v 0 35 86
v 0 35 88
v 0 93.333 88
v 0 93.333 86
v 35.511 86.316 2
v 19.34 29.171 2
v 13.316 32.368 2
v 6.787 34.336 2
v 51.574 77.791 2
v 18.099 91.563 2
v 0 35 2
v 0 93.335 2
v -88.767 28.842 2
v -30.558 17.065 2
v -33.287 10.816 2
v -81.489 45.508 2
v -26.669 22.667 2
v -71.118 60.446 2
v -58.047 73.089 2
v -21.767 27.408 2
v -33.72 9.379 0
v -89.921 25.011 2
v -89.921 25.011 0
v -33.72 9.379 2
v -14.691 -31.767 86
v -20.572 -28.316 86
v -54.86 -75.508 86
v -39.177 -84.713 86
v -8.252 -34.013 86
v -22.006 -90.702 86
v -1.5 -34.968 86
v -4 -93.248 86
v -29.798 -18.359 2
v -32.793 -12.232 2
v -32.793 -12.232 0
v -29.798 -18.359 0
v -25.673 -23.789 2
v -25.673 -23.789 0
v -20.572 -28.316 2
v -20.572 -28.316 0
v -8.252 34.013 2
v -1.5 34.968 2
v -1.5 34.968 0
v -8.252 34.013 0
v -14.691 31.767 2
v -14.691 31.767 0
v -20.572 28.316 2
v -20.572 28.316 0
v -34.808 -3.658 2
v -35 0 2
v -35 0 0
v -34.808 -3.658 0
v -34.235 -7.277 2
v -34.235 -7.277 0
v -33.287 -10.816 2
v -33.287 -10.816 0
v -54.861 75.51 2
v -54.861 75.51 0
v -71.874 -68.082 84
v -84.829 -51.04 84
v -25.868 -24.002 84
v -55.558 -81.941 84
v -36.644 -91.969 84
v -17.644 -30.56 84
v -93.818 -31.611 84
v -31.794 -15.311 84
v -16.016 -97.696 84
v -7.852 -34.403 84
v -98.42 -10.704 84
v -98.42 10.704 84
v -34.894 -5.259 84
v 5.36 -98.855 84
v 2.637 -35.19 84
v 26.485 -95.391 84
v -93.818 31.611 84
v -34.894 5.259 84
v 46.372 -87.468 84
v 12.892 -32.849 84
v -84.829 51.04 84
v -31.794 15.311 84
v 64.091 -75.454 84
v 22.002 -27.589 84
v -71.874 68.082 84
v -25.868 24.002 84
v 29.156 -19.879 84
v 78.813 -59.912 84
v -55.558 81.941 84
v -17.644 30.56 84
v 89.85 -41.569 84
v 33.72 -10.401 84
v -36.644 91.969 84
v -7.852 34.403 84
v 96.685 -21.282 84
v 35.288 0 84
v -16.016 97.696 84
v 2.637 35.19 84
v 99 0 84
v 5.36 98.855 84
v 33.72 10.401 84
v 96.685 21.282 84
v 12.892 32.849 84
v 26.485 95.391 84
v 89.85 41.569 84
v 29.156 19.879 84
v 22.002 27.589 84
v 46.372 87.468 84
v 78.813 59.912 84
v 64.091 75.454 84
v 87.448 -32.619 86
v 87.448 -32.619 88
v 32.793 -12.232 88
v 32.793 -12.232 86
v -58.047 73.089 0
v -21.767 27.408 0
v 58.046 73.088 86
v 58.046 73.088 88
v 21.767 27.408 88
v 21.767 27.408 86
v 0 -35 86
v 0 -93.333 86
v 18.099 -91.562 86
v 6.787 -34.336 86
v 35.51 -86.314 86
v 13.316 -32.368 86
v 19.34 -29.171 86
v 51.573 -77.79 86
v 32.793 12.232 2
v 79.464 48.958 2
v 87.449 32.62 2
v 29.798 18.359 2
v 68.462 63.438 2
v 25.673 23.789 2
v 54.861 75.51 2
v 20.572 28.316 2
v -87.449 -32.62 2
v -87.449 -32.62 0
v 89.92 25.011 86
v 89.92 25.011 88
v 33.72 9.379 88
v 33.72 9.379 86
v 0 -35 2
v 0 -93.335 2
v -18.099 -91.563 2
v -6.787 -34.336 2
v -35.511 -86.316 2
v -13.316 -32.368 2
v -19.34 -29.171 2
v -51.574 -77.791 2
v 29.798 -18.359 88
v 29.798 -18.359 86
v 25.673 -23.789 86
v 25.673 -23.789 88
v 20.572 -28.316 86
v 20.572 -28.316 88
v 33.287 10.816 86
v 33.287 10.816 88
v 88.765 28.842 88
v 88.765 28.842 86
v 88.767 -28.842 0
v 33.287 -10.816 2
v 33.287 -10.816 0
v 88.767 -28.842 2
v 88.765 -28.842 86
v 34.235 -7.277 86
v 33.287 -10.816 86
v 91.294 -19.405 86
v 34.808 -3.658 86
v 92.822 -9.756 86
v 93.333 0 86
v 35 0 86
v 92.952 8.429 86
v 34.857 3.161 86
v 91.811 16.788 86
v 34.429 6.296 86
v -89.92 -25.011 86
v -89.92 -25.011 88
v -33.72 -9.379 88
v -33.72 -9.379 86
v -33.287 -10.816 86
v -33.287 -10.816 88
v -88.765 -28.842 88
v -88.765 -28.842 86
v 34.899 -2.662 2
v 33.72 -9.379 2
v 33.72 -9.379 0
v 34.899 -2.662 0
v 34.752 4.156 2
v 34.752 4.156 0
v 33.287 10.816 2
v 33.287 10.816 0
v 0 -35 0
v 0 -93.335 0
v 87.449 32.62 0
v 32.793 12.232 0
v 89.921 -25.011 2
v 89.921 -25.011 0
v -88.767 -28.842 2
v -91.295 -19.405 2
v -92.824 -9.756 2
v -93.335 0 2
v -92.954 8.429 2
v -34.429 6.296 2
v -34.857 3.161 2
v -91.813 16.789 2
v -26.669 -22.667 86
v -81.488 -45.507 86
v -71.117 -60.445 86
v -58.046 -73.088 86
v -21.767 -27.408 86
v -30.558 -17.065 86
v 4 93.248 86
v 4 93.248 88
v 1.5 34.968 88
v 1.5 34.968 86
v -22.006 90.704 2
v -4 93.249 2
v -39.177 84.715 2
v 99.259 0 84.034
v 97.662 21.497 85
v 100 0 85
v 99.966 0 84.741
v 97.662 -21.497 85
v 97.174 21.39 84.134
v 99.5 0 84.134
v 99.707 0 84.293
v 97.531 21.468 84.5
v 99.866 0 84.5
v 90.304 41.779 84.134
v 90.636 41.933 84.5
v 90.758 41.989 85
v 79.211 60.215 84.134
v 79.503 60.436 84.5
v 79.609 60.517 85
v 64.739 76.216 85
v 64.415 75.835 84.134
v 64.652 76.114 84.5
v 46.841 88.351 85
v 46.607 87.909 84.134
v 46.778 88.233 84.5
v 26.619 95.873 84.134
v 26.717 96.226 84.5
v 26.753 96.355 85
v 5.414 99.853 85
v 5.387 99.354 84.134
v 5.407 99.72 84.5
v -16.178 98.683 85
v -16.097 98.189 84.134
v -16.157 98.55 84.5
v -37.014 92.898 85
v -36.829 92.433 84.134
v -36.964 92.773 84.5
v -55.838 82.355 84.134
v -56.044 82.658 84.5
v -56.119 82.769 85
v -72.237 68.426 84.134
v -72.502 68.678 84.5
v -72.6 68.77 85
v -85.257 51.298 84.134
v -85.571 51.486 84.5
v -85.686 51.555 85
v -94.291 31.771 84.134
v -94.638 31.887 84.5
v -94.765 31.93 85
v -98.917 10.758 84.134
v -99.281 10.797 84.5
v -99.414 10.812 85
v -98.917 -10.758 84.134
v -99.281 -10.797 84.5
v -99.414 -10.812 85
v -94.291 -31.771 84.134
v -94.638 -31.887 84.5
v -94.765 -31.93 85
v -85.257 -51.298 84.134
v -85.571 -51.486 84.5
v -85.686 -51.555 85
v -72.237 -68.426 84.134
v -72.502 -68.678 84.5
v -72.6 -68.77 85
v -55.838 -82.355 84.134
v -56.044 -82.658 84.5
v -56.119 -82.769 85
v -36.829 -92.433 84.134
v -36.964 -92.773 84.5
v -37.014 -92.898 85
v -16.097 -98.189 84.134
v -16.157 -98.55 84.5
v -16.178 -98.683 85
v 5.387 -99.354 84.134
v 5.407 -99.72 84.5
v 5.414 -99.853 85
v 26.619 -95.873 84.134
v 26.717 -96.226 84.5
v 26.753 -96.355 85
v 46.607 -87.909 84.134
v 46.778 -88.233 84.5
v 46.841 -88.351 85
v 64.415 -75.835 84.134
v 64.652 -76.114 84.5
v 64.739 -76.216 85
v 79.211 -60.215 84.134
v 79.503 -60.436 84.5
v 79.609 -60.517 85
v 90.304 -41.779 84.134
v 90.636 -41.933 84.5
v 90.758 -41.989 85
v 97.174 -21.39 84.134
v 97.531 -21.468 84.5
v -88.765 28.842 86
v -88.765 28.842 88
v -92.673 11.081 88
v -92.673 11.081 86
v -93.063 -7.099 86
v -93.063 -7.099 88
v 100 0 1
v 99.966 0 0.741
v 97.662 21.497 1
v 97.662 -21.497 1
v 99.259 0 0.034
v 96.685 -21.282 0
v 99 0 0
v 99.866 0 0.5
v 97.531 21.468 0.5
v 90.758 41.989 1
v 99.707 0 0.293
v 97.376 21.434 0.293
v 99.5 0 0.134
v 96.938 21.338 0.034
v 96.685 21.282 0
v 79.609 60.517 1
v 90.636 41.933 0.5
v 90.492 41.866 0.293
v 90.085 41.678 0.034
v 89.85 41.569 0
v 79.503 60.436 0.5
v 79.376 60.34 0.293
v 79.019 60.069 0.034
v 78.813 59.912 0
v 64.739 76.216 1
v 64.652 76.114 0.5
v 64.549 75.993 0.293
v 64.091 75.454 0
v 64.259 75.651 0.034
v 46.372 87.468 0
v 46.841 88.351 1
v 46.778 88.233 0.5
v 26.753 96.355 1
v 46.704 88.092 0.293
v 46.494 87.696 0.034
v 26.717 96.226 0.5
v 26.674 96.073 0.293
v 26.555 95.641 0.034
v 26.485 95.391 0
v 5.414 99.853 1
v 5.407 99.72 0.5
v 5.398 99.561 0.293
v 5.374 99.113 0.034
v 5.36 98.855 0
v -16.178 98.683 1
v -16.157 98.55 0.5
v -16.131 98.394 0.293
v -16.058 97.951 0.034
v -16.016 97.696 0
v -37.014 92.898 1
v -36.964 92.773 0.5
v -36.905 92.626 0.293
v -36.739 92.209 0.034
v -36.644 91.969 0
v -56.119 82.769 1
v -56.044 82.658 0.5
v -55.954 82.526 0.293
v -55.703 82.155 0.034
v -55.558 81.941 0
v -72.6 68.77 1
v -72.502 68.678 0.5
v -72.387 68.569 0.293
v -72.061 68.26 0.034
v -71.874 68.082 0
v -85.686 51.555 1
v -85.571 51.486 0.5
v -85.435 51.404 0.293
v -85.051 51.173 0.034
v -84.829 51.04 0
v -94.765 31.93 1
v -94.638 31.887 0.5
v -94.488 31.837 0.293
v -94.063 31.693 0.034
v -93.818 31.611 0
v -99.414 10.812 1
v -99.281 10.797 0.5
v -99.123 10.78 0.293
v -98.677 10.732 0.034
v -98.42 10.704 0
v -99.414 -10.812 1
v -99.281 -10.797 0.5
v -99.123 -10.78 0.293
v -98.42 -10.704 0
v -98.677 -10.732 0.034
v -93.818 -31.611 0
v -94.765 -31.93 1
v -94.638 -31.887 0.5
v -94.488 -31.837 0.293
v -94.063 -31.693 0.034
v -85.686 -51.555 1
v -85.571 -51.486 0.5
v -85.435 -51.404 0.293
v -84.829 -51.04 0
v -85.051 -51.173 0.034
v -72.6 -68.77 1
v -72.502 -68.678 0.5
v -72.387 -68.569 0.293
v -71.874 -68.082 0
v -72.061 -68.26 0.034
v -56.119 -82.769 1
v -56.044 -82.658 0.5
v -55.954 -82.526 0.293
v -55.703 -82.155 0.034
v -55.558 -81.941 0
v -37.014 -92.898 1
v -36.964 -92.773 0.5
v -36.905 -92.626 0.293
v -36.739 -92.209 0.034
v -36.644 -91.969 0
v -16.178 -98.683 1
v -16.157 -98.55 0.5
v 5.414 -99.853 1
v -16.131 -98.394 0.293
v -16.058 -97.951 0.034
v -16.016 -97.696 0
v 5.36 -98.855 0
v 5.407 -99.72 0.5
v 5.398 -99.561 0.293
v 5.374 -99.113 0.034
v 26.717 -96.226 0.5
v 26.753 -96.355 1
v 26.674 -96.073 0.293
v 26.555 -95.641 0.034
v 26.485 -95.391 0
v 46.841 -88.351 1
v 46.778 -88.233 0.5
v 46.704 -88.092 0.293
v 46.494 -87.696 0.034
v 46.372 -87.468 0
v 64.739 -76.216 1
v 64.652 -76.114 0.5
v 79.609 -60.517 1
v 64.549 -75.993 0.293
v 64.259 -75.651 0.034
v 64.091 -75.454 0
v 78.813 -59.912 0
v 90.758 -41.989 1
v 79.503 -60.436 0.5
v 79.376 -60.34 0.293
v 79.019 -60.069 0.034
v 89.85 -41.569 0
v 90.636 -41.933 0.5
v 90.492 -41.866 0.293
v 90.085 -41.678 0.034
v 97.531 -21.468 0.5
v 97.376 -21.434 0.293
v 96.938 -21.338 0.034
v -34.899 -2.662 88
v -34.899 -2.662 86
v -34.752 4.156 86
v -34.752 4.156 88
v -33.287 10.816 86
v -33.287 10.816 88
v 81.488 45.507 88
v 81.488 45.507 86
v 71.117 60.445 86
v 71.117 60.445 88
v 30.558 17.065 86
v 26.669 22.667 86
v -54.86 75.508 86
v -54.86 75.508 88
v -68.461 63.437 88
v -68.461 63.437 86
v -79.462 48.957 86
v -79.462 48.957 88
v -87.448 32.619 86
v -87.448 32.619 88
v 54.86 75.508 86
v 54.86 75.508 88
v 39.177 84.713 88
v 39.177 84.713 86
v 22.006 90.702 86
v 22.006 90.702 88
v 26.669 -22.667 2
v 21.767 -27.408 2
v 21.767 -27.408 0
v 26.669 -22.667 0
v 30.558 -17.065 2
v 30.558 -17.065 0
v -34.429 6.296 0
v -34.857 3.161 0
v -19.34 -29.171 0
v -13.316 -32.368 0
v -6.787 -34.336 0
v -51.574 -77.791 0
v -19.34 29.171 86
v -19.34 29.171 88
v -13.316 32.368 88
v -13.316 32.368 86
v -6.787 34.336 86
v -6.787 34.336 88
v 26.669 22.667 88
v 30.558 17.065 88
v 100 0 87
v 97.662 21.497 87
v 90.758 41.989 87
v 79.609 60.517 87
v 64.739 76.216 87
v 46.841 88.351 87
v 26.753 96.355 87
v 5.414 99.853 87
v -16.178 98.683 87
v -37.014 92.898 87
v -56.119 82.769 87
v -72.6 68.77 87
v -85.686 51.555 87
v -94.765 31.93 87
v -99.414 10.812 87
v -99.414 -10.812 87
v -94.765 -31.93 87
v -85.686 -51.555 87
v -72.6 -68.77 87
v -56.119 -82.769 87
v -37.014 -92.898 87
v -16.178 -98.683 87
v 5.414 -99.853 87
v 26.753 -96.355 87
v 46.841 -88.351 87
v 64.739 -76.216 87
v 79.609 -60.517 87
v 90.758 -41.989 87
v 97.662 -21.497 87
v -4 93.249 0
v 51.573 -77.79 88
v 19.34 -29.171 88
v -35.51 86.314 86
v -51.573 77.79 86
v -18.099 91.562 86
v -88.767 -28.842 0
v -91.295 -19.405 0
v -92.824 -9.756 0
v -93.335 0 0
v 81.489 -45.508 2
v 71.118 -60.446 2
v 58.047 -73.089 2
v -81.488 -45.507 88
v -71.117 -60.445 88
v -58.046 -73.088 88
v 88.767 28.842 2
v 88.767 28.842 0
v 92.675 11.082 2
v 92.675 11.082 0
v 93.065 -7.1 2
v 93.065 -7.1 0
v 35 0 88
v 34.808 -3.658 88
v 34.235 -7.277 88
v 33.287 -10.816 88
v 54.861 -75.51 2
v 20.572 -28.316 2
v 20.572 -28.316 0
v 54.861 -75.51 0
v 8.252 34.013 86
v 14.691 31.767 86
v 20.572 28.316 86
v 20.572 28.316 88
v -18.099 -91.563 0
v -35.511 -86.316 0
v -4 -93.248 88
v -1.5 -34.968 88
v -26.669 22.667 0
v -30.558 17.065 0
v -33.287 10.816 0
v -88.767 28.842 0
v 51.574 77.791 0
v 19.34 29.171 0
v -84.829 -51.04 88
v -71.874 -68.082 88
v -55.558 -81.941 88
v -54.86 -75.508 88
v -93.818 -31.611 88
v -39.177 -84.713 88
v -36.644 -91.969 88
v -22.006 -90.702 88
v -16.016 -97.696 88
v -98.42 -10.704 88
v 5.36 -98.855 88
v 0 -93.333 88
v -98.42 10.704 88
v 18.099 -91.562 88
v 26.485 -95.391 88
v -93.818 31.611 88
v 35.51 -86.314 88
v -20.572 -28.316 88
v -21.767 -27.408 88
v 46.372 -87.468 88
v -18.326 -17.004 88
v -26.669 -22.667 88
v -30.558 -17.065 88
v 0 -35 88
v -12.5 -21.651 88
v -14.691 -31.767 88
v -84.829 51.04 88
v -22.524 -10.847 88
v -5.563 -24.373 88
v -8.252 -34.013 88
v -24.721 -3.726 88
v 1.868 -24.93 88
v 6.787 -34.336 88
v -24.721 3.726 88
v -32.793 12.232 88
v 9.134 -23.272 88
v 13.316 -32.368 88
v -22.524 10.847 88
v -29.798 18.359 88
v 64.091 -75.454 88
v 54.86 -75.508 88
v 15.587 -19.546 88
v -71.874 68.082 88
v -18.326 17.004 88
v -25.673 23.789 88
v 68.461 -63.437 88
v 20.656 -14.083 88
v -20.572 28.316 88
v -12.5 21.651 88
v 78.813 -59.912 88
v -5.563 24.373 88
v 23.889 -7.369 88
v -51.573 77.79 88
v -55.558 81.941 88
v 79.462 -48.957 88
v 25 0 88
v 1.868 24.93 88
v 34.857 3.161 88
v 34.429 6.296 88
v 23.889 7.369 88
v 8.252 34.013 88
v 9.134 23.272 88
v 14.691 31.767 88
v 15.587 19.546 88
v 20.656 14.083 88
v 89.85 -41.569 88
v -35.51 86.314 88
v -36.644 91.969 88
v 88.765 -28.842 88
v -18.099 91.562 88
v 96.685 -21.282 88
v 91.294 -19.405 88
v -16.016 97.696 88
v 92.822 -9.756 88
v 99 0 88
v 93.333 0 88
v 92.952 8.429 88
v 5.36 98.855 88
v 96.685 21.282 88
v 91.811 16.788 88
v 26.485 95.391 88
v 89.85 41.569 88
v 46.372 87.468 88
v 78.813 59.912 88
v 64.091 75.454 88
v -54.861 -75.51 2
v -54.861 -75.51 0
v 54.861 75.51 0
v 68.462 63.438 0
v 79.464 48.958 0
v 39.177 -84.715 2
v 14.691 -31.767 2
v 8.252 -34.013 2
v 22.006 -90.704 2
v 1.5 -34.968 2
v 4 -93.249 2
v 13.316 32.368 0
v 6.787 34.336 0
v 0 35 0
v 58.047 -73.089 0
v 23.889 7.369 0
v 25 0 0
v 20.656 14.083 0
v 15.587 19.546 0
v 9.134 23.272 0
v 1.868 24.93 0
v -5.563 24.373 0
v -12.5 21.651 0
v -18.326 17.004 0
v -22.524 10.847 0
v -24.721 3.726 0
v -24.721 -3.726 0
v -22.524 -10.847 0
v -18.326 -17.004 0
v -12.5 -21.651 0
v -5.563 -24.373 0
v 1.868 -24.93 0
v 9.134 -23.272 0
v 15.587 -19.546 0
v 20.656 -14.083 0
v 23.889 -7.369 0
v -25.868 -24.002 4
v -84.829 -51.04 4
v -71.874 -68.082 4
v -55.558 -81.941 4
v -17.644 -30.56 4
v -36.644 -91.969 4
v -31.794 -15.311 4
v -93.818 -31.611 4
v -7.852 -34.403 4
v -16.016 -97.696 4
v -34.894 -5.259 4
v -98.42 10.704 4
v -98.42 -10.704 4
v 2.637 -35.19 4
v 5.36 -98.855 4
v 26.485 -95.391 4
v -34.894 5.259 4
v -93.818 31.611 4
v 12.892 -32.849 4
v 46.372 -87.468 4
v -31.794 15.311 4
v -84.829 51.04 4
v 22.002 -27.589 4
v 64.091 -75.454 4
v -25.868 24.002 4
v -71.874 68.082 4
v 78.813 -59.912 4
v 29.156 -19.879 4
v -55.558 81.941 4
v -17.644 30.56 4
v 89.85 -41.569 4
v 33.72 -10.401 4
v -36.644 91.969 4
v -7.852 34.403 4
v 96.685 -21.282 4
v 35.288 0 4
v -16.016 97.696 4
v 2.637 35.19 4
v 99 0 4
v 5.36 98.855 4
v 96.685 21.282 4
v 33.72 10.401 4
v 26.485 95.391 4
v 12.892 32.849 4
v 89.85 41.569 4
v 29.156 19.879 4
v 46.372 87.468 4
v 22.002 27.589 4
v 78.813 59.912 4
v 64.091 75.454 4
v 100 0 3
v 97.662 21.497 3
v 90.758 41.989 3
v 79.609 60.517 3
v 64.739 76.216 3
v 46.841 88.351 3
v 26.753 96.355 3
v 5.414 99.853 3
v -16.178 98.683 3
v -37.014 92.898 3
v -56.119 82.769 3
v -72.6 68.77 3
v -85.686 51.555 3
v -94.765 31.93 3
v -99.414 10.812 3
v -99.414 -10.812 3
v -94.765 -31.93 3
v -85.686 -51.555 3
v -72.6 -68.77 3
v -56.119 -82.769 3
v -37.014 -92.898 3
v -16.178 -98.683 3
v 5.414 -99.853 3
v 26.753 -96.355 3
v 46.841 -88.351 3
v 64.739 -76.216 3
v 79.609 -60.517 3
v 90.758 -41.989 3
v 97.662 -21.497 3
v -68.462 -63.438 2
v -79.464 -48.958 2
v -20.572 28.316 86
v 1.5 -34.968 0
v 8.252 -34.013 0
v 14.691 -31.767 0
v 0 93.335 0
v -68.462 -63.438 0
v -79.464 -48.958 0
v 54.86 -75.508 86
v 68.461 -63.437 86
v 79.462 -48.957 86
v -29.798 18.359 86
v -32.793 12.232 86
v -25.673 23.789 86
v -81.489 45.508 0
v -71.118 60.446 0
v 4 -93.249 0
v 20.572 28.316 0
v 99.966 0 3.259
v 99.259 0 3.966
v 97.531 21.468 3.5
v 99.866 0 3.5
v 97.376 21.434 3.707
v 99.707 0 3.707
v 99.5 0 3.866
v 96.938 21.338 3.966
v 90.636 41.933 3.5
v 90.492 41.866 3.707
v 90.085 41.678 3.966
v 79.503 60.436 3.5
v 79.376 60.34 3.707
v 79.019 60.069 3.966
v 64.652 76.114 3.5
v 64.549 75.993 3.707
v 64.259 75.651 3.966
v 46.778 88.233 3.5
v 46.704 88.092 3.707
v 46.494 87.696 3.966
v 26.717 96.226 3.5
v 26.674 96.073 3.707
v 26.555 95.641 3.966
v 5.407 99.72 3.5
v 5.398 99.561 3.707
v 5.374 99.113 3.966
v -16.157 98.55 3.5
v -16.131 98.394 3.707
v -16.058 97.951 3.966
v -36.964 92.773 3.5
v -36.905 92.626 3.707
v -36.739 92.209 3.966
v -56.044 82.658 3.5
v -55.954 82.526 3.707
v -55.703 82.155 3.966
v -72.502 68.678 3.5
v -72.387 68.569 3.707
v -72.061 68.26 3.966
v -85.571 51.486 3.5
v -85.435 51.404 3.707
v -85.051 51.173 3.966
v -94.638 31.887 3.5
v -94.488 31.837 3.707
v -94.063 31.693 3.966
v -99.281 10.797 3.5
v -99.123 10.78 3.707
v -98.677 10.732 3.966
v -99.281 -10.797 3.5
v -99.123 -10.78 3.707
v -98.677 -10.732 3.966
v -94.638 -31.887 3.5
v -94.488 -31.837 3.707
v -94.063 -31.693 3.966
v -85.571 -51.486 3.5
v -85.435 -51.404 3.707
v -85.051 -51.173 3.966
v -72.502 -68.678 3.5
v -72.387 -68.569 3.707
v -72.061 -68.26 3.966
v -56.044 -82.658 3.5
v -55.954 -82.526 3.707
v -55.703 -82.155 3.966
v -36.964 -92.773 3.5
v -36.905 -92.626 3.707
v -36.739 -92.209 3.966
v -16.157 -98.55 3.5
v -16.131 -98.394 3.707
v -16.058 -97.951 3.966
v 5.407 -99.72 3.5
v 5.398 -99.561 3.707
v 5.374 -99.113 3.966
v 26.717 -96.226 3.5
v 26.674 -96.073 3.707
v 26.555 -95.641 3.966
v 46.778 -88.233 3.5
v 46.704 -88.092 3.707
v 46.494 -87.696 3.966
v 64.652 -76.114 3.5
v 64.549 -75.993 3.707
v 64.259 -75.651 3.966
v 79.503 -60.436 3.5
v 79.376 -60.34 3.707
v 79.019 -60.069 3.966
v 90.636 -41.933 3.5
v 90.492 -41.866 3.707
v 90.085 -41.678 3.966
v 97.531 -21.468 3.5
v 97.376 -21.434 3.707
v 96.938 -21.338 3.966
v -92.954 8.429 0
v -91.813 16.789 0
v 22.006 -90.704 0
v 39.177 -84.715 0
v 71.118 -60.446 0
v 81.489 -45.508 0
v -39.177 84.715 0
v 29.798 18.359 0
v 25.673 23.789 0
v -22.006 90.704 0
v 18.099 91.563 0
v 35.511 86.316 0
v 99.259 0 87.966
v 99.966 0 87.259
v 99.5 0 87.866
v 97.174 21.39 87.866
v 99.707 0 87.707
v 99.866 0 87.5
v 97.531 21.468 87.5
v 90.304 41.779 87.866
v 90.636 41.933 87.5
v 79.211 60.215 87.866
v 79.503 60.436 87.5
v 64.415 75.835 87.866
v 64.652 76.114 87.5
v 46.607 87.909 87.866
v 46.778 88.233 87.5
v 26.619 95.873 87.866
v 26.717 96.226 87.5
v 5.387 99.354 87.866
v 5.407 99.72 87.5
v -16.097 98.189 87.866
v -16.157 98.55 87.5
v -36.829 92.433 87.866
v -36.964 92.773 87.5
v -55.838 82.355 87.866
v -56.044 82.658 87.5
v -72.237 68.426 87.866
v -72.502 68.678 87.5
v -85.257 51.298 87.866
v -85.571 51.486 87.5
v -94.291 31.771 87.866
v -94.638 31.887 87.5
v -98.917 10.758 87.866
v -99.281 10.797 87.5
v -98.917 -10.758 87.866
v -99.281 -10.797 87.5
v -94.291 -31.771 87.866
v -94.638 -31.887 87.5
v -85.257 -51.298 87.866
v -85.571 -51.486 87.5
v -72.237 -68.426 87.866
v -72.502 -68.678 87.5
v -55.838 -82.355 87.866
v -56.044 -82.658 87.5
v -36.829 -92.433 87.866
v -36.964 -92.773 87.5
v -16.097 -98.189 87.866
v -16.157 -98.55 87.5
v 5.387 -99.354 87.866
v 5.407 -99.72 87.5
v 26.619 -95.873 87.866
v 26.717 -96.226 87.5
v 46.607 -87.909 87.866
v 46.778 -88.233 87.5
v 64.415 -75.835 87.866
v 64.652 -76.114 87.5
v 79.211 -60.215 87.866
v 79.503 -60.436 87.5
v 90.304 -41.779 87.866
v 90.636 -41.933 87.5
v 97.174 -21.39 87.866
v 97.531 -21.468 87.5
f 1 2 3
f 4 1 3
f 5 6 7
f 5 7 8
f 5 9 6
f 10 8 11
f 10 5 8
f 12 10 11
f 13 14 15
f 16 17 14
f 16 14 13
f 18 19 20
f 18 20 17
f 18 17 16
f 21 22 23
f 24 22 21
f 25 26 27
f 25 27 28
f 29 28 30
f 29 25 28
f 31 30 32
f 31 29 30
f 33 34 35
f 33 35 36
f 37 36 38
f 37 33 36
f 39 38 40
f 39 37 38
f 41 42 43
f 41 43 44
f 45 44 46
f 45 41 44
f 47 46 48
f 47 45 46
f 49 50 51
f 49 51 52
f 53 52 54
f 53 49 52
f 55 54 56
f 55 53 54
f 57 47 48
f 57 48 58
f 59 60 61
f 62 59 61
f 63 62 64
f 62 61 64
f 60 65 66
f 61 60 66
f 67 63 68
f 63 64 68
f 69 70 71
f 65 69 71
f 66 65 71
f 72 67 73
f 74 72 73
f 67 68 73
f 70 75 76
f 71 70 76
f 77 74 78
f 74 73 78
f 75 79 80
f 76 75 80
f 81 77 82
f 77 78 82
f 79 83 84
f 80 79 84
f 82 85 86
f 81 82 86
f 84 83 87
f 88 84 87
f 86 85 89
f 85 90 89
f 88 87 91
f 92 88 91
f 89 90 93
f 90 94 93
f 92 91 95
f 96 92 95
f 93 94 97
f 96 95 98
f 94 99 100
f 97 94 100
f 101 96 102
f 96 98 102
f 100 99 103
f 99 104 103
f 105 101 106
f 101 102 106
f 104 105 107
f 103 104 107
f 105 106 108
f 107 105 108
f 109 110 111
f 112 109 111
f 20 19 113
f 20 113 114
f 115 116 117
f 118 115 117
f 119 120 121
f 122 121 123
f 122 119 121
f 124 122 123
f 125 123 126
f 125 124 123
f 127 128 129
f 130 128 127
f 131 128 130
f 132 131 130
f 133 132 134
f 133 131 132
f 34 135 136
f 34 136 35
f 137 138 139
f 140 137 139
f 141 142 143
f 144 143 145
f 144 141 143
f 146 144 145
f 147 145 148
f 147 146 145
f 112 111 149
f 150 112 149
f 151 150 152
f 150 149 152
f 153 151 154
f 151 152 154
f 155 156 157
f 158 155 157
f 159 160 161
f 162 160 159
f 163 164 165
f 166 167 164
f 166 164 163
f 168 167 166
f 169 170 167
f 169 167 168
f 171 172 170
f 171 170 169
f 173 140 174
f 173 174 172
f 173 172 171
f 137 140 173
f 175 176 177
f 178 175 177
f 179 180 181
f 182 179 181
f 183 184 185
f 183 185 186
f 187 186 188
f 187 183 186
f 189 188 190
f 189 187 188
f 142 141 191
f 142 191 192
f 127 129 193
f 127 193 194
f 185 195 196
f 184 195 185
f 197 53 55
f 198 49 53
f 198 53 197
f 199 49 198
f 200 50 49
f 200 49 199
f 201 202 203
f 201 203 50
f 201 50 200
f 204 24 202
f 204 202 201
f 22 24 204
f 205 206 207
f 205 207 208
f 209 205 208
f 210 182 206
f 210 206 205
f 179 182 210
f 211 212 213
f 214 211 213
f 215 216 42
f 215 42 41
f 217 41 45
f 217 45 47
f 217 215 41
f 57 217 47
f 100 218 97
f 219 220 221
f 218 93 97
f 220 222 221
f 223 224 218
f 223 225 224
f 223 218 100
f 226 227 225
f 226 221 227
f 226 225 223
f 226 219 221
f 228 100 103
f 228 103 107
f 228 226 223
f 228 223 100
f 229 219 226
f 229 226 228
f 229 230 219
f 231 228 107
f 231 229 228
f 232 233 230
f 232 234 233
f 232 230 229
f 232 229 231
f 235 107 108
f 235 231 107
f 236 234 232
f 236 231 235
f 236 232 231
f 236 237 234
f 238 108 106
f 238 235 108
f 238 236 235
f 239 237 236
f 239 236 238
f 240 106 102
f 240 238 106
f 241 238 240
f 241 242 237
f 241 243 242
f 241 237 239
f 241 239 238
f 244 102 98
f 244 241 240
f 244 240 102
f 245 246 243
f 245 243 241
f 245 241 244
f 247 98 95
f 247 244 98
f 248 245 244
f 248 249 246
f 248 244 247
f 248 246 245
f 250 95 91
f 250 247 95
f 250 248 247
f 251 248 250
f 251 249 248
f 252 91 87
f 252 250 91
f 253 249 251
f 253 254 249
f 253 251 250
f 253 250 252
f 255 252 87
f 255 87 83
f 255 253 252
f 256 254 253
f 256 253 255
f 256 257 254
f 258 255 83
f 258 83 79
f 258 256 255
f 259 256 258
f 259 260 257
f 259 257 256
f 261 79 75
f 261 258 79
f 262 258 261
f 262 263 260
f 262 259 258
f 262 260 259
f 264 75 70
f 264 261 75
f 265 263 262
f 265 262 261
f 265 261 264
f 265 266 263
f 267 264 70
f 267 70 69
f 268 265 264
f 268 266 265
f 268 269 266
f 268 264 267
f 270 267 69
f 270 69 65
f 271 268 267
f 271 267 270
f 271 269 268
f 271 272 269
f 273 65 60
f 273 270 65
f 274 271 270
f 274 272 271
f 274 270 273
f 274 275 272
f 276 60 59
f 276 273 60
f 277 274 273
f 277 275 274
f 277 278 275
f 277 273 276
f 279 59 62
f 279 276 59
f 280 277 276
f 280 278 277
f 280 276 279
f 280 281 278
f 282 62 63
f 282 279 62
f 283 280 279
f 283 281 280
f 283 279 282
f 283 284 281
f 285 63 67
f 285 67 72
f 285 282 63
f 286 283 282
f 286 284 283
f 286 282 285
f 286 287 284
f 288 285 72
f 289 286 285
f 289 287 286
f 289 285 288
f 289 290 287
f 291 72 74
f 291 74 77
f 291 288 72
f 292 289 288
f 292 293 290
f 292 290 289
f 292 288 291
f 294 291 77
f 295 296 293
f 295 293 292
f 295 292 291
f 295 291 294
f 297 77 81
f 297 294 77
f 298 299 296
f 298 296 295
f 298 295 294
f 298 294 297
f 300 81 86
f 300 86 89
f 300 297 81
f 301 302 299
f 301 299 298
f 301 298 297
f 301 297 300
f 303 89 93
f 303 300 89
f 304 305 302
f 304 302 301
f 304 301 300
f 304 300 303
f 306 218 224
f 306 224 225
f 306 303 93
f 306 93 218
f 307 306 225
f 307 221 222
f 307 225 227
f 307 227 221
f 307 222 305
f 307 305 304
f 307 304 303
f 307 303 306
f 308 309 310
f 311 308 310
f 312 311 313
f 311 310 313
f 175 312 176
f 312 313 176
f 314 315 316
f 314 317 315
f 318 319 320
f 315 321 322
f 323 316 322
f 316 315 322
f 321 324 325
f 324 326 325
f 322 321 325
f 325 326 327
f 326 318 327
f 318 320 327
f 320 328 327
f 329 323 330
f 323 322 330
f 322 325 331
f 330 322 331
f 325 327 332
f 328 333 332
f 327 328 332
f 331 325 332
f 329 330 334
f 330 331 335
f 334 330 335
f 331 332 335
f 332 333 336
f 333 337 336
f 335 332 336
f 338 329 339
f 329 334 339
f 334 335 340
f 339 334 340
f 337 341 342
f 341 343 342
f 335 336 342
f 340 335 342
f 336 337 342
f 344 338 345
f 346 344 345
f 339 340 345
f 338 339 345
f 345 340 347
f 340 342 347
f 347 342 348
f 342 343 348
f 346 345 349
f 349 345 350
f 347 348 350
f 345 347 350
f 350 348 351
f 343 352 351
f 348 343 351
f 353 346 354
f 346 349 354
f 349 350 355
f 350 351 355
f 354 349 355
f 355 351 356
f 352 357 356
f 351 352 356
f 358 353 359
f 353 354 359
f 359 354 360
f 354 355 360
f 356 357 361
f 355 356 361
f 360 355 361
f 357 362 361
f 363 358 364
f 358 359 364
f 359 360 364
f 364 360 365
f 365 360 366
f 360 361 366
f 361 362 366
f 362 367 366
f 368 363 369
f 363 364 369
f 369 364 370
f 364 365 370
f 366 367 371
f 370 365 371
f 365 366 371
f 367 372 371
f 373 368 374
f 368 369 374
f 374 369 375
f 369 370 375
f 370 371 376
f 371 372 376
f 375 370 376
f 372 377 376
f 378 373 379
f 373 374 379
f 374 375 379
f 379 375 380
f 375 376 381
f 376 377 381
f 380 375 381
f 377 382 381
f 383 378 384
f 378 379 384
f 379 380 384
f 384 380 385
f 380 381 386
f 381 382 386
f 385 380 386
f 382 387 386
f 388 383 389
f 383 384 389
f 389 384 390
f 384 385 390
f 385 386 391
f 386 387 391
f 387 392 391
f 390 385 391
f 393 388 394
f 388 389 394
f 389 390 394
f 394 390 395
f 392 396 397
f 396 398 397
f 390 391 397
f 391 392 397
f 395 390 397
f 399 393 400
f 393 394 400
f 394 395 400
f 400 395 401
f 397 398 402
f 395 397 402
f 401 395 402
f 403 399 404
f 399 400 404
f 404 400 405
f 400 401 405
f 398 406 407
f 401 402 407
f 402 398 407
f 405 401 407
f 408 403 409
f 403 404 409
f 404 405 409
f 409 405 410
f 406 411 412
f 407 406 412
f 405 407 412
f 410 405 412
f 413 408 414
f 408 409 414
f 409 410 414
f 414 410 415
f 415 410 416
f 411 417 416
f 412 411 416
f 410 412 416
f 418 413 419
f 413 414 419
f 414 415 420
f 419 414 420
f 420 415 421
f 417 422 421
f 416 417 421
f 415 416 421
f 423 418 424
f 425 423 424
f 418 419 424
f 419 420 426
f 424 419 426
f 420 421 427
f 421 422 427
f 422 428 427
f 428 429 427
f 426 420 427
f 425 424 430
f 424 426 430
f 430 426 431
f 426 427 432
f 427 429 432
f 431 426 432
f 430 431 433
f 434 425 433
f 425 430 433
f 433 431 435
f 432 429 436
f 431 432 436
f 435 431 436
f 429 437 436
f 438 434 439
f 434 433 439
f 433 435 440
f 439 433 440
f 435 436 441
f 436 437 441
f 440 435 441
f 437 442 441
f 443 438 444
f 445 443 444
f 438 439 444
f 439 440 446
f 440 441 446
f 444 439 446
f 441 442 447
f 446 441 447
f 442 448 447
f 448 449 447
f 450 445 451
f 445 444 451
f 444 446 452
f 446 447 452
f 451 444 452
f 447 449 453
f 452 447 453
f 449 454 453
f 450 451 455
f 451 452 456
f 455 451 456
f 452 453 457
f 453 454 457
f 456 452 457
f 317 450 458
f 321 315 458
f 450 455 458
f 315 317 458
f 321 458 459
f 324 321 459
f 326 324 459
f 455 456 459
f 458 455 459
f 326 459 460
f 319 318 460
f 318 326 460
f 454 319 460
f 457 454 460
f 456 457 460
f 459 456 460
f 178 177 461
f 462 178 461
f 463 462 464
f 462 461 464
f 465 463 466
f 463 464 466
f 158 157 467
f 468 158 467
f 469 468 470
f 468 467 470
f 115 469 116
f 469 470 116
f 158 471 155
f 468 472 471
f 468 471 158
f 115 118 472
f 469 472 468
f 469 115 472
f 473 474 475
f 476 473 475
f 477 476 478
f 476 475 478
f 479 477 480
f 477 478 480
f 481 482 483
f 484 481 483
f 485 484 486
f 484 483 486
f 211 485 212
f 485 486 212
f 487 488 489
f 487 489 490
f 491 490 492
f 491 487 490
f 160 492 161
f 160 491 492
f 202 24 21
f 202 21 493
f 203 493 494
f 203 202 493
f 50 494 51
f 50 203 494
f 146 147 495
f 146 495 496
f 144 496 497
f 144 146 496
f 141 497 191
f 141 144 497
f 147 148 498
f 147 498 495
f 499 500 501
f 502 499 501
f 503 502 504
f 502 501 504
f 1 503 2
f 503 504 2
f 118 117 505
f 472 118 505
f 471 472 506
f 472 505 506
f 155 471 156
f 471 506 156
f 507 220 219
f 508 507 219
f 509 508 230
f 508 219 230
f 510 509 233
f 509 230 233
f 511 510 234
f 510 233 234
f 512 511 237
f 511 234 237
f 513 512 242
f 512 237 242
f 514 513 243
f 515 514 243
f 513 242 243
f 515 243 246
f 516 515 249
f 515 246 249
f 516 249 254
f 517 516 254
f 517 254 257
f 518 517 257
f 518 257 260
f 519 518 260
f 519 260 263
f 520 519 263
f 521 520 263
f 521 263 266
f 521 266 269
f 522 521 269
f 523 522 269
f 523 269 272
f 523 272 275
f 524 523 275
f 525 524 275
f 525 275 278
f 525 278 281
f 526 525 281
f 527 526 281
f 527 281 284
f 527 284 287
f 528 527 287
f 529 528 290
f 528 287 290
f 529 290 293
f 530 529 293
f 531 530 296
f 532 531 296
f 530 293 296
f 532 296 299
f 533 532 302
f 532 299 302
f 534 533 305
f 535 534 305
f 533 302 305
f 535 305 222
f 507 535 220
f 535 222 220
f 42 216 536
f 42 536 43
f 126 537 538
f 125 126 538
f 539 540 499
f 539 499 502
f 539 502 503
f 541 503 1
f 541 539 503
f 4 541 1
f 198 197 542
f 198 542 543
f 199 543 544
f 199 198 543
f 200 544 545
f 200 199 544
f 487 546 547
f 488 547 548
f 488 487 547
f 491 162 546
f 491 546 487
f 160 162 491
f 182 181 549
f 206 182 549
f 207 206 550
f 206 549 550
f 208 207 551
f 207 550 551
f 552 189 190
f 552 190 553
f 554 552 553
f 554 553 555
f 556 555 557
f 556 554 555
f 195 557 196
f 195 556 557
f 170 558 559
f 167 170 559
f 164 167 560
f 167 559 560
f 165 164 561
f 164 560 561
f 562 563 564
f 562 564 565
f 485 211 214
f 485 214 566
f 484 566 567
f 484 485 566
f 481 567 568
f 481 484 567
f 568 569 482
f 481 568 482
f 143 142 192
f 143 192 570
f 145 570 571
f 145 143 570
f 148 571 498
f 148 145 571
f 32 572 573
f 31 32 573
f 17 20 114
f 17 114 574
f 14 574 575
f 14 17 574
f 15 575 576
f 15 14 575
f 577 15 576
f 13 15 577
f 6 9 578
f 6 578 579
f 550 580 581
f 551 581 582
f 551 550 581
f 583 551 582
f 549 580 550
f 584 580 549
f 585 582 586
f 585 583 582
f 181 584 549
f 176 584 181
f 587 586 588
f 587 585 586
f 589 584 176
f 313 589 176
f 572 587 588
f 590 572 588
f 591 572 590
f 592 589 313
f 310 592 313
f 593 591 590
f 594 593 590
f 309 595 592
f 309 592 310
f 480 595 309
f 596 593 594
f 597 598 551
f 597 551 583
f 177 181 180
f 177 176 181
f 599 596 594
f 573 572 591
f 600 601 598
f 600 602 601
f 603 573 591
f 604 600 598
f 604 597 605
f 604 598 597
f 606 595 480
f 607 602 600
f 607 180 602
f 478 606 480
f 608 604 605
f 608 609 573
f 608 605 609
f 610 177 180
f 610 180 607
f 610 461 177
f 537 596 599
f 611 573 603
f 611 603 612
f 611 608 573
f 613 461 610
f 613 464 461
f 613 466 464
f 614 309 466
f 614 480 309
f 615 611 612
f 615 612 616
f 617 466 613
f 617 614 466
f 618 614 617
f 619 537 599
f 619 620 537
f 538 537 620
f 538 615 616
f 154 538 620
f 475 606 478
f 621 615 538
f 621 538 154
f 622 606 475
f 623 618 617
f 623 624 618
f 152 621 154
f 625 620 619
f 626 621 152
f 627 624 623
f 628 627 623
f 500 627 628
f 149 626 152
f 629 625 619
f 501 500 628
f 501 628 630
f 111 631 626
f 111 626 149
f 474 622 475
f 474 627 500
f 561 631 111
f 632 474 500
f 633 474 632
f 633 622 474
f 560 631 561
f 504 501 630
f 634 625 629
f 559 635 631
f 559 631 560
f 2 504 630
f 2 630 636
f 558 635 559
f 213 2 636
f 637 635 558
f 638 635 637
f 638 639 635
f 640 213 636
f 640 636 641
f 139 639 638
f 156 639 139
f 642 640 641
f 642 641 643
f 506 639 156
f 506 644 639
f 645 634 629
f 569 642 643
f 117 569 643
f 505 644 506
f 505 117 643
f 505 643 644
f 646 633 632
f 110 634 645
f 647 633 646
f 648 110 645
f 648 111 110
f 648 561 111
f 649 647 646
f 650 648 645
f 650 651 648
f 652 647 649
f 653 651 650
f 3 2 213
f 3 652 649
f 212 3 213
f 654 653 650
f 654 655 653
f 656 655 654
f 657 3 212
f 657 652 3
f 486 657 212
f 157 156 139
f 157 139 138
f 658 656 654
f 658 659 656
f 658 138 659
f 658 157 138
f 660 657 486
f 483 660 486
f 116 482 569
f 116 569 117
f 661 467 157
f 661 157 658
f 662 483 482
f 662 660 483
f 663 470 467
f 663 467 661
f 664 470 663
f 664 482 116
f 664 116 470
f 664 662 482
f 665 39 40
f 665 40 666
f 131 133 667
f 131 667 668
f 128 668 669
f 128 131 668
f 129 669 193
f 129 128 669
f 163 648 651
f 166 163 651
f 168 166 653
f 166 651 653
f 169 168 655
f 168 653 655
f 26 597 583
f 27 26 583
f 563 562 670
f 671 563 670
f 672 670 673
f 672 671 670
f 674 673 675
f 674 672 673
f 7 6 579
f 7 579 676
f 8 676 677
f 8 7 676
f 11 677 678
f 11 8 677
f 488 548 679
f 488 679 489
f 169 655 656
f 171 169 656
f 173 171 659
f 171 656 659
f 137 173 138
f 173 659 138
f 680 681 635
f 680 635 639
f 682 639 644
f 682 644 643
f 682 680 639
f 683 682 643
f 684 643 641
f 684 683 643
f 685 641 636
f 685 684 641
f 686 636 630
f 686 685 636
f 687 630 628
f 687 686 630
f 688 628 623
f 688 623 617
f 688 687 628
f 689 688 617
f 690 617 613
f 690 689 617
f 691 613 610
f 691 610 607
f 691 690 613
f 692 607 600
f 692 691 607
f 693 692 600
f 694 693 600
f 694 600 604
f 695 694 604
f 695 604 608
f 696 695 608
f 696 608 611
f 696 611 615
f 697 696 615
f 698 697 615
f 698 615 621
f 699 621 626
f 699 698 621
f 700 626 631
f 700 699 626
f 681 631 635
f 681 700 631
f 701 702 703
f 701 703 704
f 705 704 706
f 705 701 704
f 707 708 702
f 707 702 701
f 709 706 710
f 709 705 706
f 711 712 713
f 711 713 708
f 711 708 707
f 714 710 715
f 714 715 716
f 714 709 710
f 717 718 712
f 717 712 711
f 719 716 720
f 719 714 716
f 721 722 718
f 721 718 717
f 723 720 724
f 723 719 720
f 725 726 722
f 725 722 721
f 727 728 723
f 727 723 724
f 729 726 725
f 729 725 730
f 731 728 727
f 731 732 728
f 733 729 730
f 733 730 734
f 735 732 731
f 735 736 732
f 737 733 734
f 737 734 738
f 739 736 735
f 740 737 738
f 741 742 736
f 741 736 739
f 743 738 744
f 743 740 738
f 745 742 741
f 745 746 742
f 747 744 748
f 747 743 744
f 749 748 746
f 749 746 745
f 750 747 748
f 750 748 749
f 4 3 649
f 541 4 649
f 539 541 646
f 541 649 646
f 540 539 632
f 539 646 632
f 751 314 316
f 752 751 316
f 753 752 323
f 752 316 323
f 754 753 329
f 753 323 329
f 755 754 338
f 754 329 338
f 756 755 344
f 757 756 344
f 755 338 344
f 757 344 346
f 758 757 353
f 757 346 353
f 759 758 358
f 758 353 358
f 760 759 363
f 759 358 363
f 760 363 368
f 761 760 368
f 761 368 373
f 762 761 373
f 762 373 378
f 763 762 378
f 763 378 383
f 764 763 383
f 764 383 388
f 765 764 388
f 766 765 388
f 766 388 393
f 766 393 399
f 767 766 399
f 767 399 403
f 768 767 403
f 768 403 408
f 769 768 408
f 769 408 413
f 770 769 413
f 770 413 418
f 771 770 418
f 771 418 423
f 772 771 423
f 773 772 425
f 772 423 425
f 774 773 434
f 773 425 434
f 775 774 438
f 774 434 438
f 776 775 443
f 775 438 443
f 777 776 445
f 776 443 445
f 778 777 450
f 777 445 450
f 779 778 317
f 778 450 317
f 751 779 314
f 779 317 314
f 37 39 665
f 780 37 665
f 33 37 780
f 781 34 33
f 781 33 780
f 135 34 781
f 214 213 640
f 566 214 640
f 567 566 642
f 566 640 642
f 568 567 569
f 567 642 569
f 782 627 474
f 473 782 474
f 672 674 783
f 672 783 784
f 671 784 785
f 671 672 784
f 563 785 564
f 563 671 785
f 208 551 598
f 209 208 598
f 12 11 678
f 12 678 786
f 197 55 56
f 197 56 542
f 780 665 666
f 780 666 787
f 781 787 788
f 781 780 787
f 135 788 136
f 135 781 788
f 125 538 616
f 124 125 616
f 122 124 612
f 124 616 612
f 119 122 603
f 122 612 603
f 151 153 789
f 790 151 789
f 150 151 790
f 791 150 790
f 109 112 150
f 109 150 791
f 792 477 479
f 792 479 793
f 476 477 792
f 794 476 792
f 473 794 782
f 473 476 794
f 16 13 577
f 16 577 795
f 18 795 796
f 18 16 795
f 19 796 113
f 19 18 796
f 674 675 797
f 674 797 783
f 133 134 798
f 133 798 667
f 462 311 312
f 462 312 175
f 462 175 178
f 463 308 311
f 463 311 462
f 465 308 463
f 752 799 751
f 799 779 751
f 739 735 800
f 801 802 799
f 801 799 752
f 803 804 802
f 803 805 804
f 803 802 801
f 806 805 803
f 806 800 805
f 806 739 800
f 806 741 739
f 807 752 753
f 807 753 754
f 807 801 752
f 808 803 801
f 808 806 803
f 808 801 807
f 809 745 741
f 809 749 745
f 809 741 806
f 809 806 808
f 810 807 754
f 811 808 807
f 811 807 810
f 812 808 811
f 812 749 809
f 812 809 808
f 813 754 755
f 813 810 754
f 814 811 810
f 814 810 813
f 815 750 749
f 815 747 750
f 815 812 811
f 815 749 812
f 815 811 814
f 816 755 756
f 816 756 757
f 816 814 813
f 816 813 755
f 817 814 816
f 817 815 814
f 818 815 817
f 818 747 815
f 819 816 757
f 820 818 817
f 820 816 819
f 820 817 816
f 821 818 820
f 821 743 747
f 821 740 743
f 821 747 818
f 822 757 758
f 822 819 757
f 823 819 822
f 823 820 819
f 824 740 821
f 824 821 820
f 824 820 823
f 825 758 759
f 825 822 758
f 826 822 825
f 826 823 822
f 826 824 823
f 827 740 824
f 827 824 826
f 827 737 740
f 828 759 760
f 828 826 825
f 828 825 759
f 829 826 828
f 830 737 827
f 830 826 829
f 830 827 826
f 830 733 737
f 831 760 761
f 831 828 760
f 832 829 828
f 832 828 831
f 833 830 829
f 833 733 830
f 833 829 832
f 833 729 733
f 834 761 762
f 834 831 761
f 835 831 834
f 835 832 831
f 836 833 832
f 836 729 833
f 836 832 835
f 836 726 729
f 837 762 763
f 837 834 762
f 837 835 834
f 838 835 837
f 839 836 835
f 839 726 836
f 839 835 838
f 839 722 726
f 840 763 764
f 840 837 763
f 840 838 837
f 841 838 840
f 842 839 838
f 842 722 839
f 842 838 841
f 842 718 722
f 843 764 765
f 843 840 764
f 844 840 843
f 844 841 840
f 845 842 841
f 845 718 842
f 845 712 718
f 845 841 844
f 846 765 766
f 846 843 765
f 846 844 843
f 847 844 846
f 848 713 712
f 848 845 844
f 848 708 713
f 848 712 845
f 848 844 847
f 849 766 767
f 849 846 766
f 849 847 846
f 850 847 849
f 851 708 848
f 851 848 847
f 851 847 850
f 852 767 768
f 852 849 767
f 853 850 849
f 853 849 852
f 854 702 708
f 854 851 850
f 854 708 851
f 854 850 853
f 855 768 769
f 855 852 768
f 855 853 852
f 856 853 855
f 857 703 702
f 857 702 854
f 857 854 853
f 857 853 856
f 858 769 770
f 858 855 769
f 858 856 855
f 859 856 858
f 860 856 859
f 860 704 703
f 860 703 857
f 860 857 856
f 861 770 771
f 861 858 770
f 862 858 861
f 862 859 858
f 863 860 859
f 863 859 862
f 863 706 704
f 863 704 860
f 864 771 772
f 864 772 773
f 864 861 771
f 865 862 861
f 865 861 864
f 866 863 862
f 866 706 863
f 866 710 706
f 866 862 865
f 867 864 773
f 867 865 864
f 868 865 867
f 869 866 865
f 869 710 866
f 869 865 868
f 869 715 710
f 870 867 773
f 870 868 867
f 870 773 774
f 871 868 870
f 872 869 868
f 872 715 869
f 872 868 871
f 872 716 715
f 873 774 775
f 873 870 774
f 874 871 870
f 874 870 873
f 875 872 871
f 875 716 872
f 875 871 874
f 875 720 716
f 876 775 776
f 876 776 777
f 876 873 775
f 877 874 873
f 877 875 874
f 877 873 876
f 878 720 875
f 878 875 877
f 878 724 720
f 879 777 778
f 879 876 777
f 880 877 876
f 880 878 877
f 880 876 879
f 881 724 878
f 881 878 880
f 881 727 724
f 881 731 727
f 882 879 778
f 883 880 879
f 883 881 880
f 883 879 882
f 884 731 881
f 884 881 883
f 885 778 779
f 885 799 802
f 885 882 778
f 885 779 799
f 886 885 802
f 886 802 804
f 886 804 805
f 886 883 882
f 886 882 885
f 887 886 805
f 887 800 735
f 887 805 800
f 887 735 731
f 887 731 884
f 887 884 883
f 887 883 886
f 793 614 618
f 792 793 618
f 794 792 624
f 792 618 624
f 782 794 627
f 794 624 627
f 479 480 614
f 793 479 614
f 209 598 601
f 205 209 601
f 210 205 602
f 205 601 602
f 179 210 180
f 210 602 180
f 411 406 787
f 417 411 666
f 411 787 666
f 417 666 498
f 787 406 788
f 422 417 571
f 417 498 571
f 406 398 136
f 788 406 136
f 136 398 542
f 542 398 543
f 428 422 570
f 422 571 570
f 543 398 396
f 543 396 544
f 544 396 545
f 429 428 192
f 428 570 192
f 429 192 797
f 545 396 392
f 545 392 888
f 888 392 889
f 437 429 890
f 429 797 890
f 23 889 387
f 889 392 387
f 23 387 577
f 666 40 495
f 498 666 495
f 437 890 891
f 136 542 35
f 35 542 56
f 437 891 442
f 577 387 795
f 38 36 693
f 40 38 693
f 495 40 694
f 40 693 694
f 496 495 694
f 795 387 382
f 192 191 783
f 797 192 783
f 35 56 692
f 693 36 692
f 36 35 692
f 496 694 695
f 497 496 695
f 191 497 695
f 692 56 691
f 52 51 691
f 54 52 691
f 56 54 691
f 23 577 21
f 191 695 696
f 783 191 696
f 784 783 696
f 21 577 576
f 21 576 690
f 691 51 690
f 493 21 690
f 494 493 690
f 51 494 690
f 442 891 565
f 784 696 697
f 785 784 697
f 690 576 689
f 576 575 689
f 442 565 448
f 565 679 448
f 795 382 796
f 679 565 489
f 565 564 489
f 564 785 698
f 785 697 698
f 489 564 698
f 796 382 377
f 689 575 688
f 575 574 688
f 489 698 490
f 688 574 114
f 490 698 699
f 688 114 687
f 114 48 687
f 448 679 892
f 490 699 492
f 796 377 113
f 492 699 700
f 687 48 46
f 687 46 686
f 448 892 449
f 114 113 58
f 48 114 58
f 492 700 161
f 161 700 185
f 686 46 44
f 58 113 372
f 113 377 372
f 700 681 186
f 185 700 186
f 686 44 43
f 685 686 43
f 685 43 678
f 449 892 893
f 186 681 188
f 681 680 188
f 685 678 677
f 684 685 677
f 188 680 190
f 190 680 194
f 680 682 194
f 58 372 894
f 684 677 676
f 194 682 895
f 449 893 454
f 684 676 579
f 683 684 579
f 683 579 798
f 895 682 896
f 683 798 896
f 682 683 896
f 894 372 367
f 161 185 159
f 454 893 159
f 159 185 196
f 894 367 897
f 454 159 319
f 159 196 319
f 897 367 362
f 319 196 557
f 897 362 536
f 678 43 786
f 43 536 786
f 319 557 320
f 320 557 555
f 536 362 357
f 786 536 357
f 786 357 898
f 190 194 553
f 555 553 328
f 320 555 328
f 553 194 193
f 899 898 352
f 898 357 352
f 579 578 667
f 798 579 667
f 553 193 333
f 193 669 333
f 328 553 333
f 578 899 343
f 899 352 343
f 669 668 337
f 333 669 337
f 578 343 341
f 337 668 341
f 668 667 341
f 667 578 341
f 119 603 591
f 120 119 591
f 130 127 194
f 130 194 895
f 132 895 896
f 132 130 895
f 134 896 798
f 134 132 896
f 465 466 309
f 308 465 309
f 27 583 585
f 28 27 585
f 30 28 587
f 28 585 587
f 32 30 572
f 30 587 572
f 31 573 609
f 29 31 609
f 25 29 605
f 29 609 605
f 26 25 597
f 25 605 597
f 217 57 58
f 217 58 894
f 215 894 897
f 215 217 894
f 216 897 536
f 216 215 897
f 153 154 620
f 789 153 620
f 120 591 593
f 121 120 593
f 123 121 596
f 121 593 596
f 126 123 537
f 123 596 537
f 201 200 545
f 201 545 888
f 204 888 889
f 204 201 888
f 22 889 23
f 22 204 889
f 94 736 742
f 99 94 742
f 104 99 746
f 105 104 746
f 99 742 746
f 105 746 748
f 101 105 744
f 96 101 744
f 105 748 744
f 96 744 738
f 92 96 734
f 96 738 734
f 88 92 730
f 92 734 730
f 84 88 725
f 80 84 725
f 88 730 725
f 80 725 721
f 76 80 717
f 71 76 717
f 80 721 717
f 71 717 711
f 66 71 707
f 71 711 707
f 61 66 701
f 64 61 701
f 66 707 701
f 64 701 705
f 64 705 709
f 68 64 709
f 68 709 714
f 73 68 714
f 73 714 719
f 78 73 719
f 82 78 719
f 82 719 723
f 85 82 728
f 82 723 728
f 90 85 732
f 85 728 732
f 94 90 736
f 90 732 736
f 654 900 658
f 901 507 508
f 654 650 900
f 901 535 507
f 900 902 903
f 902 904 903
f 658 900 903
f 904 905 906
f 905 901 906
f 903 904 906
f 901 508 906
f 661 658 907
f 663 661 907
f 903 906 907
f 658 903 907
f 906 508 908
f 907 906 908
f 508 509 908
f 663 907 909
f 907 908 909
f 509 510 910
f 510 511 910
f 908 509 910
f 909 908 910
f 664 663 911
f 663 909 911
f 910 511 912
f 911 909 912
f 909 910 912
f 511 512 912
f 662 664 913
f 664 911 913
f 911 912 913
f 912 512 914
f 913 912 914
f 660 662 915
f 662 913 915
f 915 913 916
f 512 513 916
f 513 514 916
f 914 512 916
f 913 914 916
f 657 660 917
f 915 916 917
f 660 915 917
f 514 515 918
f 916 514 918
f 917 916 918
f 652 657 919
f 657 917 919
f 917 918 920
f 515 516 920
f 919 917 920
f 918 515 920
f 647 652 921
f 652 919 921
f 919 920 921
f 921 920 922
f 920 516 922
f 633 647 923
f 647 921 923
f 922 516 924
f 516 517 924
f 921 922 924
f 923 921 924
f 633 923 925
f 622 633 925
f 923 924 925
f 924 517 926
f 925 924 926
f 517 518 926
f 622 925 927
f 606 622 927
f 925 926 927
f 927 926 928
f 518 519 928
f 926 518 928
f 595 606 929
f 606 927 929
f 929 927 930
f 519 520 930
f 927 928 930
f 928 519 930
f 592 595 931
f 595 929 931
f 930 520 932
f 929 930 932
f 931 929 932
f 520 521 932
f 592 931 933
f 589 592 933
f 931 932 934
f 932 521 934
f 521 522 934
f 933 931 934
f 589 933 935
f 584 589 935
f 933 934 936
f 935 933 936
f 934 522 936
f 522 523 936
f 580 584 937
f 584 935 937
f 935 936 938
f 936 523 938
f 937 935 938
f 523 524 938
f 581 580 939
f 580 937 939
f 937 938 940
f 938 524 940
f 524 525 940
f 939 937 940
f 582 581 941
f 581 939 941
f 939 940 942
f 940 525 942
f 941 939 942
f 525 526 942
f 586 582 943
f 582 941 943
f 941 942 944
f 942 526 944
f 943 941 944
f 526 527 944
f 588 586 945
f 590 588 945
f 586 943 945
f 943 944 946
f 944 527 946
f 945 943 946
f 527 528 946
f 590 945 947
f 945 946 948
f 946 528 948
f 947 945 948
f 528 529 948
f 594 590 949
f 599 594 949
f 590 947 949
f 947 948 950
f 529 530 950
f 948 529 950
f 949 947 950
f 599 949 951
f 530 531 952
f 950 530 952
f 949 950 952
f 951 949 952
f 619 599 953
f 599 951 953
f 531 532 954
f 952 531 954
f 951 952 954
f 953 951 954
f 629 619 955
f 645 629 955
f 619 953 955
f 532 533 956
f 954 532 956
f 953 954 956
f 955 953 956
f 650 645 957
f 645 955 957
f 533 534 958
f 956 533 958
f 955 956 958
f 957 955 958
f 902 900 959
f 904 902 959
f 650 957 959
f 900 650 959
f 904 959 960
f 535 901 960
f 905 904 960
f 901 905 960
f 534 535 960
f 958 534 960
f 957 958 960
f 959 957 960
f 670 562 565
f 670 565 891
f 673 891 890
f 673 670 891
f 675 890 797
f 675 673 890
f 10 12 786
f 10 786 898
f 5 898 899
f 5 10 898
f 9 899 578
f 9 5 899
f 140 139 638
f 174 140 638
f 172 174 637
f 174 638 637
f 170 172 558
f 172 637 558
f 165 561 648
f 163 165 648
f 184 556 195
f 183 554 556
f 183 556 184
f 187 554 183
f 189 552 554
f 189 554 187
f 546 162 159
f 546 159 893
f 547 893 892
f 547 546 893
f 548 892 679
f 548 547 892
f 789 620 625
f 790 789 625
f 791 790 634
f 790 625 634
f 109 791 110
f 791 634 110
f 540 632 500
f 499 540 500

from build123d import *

# Parameters (mm, degrees)
SKICA1_R                 = 100
SKICA1_R_2               = 25
P_IDAT_VYSUNUT_M1_DEPTH  = 88
ODEBRAT_START            = -80
SKICA2_R                 = 100
SKICA2_R_2               = 35.288223769
ODEBRAT_VYSUNUT_M1_DEPTH = 80
ZAOBLIT1_R               = 1
ODEBRAT_VYSUNUT_M2_DEPTH = 2
ODEBRAT_START_2          = -2
ODEBRAT_VYSUNUT_M3_DEPTH = 2


with BuildPart() as part:
    # Skica1 → Přidat vysunutím1 (new body)
    with BuildSketch(Plane.XY):
        Circle(SKICA1_R)
        Circle(SKICA1_R_2, mode=Mode.SUBTRACT)
    extrude(amount=P_IDAT_VYSUNUT_M1_DEPTH)

    # Skica2 → Odebrat vysunutím1 (cut)
    with BuildSketch(Plane.XY.offset(84).offset(ODEBRAT_START)):
        Circle(SKICA2_R)
        Circle(SKICA2_R_2, mode=Mode.SUBTRACT)
    extrude(amount=ODEBRAT_VYSUNUT_M1_DEPTH, mode=Mode.SUBTRACT)

    # Zaoblit1
    zaoblit1_edges = [part.edges().sort_by_distance(p)[0] for p in [
        (-100, 0, 4),
        (-100, 0, 84),
        (-100, 0, 0),
        (-100, 0, 88),
    ]]
    fillet(zaoblit1_edges, radius=ZAOBLIT1_R)

    # Skica3 → Odebrat vysunutím2 (cut)
    with BuildSketch(Plane.XY.offset(88)):
        with BuildLine():
            Line((0, 35), (0, 93.333333333))
            ThreePointArc((0, 93.333333333), (-26.932410451, 89.363059361), (-51.573484154, 77.790017633))
            Line((-51.573484154, 77.790017633), (-19.340056558, 29.171256612))
            ThreePointArc((-19.340056558, 29.171256612), (-10.099653919, 33.51114726), (0, 35))
        make_face()
        with BuildLine():
            Line((-20.57248383, 28.315594803), (-54.859956881, 75.508252808))
            ThreePointArc((-54.859956881, 75.508252808), (-74.315066147, 56.465760021), (-87.44765028, 32.619312862))
            Line((-87.44765028, 32.619312862), (-32.792868855, 12.232242323))
            ThreePointArc((-32.792868855, 12.232242323), (-27.868149805, 21.174660008), (-20.57248383, 28.315594803))
        make_face()
        with BuildLine():
            ThreePointArc((54.859956881, 75.508252808), (30.737510638, 88.126707364), (4, 93.247579653))
            Line((4, 93.247579653), (1.5, 34.96784237))
            ThreePointArc((1.5, 34.96784237), (11.526566489, 33.047515262), (20.57248383, 28.315594803))
            Line((20.57248383, 28.315594803), (54.859956881, 75.508252808))
        make_face()
        with BuildLine():
            ThreePointArc((88.765274854, 28.841586142), (76.666747393, 53.228948471), (58.045620109, 73.087735614))
            Line((58.045620109, 73.087735614), (21.767107541, 27.407900855))
            ThreePointArc((21.767107541, 27.407900855), (28.750030272, 19.960855677), (33.28697807, 10.815594803))
            Line((33.28697807, 10.815594803), (88.765274854, 28.841586142))
        make_face()
        with BuildLine():
            ThreePointArc((93.333333333, 0), (92.476009032, 12.621365401), (89.919786235, 25.010860732))
            Line((89.919786235, 25.010860732), (33.719919838, 9.379072774))
            ThreePointArc((33.719919838, 9.379072774), (34.678503387, 4.733012025), (35, 0))
            ThreePointArc((35, 0), (34.569091921, -5.475206276), (33.28697807, -10.815594803))
            Line((33.28697807, -10.815594803), (88.765274854, -28.841586142))
            ThreePointArc((88.765274854, -28.841586142), (92.184245122, -14.60055007), (93.333333333, 0))
        make_face()
        with BuildLine():
            ThreePointArc((54.859956881, -75.508252808), (74.315066147, -56.465760021), (87.44765028, -32.619312862))
            Line((87.44765028, -32.619312862), (32.792868855, -12.232242323))
            ThreePointArc((32.792868855, -12.232242323), (27.868149805, -21.174660008), (20.57248383, -28.315594803))
            Line((20.57248383, -28.315594803), (54.859956881, -75.508252808))
        make_face()
        with BuildLine():
            ThreePointArc((0, -93.333333333), (26.932410451, -89.363059361), (51.573484154, -77.790017633))
            Line((51.573484154, -77.790017633), (19.340056558, -29.171256612))
            ThreePointArc((19.340056558, -29.171256612), (10.099653919, -33.51114726), (0, -35))
            Line((0, -35), (0, -93.333333333))
        make_face()
        with BuildLine():
            Line((-20.57248383, -28.315594803), (-54.859956881, -75.508252808))
            ThreePointArc((-54.859956881, -75.508252808), (-30.737510638, -88.126707364), (-4, -93.247579653))
            Line((-4, -93.247579653), (-1.5, -34.96784237))
            ThreePointArc((-1.5, -34.96784237), (-11.526566489, -33.047515262), (-20.57248383, -28.315594803))
        make_face()
        with BuildLine():
            Line((-33.28697807, -10.815594803), (-88.765274854, -28.841586142))
            ThreePointArc((-88.765274854, -28.841586142), (-76.666747393, -53.228948471), (-58.045620109, -73.087735614))
            Line((-58.045620109, -73.087735614), (-21.767107541, -27.407900855))
            ThreePointArc((-21.767107541, -27.407900855), (-28.750030272, -19.960855677), (-33.28697807, -10.815594803))
        make_face()
        with BuildLine():
            Line((-33.28697807, 10.815594803), (-88.765274854, 28.841586142))
            ThreePointArc((-88.765274854, 28.841586142), (-93.31189245, 2.000459553), (-89.919786235, -25.010860732))
            Line((-89.919786235, -25.010860732), (-33.719919838, -9.379072774))
            ThreePointArc((-33.719919838, -9.379072774), (-34.991959669, 0.750172332), (-33.28697807, 10.815594803))
        make_face()
    extrude(amount=-ODEBRAT_VYSUNUT_M2_DEPTH, mode=Mode.SUBTRACT)

    # Skica4 → Odebrat vysunutím3 (cut)
    with BuildSketch(Plane(origin=(0, 0, 0), x_dir=(-1, 0, 0), z_dir=(0, 0, -1)).offset(ODEBRAT_START_2)):
        with BuildLine():
            ThreePointArc((-19.340078903, 29.171241798), (-10.099666754, 33.511143392), (0, 35))
            Line((0, 35), (0, 93.335))
            ThreePointArc((0, 93.335), (-26.932925613, 89.364644815), (-51.574464697, 77.791367234))
            Line((-51.574464697, 77.791367234), (-19.340078903, 29.171241798))
        make_face()
        with BuildLine():
            ThreePointArc((-32.792878225, 12.232217204), (-27.868157915, 21.174649334), (-20.57248383, 28.315594803))
            Line((-20.57248383, 28.315594803), (-54.860936523, 75.50960117))
            ThreePointArc((-54.860936523, 75.50960117), (-74.316414828, 56.466739875), (-87.449236832, 32.619828364))
            Line((-87.449236832, 32.619828364), (-32.792878225, 12.232217204))
        make_face()
        with BuildLine():
            ThreePointArc((-33.719912654, -9.379098604), (-34.991959956, 0.750158931), (-33.28697807, 10.815594803))
            Line((-33.28697807, 10.815594803), (-88.766859948, 28.84210117))
            ThreePointArc((-88.766859948, 28.84210117), (-93.3135595, 2.000459537), (-89.921372787, -25.011376234))
            Line((-89.921372787, -25.011376234), (-33.719912654, -9.379098604))
        make_face()
        with BuildLine():
            ThreePointArc((-21.767086547, -27.407917529), (-28.750022627, -19.960866688), (-33.28697807, -10.815594803))
            Line((-33.28697807, -10.815594803), (-88.766859948, -28.84210117))
            ThreePointArc((-88.766859948, -28.84210117), (-76.668096055, -53.229928352), (-58.046600652, -73.089085216))
            Line((-58.046600652, -73.089085216), (-21.767086547, -27.407917529))
        make_face()
        with BuildLine():
            ThreePointArc((-1.499973215, -34.967843519), (-11.526553832, -33.047519676), (-20.57248383, -28.315594803))
            Line((-20.57248383, -28.315594803), (-54.860936523, -75.50960117))
            ThreePointArc((-54.860936523, -75.50960117), (-30.738025769, -88.128292828), (-4, -93.249247852))
            Line((-4, -93.249247852), (-1.499973215, -34.967843519))
        make_face()
        with BuildLine():
            Line((51.574464697, -77.791367234), (19.340078903, -29.171241798))
            ThreePointArc((19.340078903, -29.171241798), (10.099666754, -33.511143392), (0, -35))
            Line((0, -35), (0, -93.335))
            ThreePointArc((0, -93.335), (26.932925613, -89.364644815), (51.574464697, -77.791367234))
        make_face()
        with BuildLine():
            Line((87.449236832, -32.619828364), (32.792878225, -12.232217204))
            ThreePointArc((32.792878225, -12.232217204), (27.868157915, -21.174649334), (20.57248383, -28.315594803))
            Line((20.57248383, -28.315594803), (54.860936523, -75.50960117))
            ThreePointArc((54.860936523, -75.50960117), (74.316414828, -56.466739875), (87.449236832, -32.619828364))
        make_face()
        with BuildLine():
            Line((89.921372787, 25.011376234), (33.719912654, 9.379098604))
            ThreePointArc((33.719912654, 9.379098604), (34.678501574, 4.733025307), (35, 0))
            ThreePointArc((35, 0), (34.569091921, -5.475206276), (33.28697807, -10.815594803))
            Line((33.28697807, -10.815594803), (88.766859948, -28.84210117))
            ThreePointArc((88.766859948, -28.84210117), (92.185891269, -14.600810795), (93.335, 0))
            ThreePointArc((93.335, 0), (92.477655555, 12.621626201), (89.921372787, 25.011376234))
        make_face()
        with BuildLine():
            Line((58.046600652, 73.089085216), (21.767086547, 27.407917529))
            ThreePointArc((21.767086547, 27.407917529), (28.750022627, 19.960866688), (33.28697807, 10.815594803))
            Line((33.28697807, 10.815594803), (88.766859948, 28.84210117))
            ThreePointArc((88.766859948, 28.84210117), (76.668096055, 53.229928352), (58.046600652, 73.089085216))
        make_face()
        with BuildLine():
            Line((4, 93.249247852), (1.499973215, 34.967843519))
            ThreePointArc((1.499973215, 34.967843519), (11.526553832, 33.047519676), (20.57248383, 28.315594803))
            Line((20.57248383, 28.315594803), (54.860936523, 75.50960117))
            ThreePointArc((54.860936523, 75.50960117), (30.738025769, 88.128292828), (4, 93.249247852))
        make_face()
    extrude(amount=ODEBRAT_VYSUNUT_M3_DEPTH, mode=Mode.SUBTRACT)


solid = part.part
